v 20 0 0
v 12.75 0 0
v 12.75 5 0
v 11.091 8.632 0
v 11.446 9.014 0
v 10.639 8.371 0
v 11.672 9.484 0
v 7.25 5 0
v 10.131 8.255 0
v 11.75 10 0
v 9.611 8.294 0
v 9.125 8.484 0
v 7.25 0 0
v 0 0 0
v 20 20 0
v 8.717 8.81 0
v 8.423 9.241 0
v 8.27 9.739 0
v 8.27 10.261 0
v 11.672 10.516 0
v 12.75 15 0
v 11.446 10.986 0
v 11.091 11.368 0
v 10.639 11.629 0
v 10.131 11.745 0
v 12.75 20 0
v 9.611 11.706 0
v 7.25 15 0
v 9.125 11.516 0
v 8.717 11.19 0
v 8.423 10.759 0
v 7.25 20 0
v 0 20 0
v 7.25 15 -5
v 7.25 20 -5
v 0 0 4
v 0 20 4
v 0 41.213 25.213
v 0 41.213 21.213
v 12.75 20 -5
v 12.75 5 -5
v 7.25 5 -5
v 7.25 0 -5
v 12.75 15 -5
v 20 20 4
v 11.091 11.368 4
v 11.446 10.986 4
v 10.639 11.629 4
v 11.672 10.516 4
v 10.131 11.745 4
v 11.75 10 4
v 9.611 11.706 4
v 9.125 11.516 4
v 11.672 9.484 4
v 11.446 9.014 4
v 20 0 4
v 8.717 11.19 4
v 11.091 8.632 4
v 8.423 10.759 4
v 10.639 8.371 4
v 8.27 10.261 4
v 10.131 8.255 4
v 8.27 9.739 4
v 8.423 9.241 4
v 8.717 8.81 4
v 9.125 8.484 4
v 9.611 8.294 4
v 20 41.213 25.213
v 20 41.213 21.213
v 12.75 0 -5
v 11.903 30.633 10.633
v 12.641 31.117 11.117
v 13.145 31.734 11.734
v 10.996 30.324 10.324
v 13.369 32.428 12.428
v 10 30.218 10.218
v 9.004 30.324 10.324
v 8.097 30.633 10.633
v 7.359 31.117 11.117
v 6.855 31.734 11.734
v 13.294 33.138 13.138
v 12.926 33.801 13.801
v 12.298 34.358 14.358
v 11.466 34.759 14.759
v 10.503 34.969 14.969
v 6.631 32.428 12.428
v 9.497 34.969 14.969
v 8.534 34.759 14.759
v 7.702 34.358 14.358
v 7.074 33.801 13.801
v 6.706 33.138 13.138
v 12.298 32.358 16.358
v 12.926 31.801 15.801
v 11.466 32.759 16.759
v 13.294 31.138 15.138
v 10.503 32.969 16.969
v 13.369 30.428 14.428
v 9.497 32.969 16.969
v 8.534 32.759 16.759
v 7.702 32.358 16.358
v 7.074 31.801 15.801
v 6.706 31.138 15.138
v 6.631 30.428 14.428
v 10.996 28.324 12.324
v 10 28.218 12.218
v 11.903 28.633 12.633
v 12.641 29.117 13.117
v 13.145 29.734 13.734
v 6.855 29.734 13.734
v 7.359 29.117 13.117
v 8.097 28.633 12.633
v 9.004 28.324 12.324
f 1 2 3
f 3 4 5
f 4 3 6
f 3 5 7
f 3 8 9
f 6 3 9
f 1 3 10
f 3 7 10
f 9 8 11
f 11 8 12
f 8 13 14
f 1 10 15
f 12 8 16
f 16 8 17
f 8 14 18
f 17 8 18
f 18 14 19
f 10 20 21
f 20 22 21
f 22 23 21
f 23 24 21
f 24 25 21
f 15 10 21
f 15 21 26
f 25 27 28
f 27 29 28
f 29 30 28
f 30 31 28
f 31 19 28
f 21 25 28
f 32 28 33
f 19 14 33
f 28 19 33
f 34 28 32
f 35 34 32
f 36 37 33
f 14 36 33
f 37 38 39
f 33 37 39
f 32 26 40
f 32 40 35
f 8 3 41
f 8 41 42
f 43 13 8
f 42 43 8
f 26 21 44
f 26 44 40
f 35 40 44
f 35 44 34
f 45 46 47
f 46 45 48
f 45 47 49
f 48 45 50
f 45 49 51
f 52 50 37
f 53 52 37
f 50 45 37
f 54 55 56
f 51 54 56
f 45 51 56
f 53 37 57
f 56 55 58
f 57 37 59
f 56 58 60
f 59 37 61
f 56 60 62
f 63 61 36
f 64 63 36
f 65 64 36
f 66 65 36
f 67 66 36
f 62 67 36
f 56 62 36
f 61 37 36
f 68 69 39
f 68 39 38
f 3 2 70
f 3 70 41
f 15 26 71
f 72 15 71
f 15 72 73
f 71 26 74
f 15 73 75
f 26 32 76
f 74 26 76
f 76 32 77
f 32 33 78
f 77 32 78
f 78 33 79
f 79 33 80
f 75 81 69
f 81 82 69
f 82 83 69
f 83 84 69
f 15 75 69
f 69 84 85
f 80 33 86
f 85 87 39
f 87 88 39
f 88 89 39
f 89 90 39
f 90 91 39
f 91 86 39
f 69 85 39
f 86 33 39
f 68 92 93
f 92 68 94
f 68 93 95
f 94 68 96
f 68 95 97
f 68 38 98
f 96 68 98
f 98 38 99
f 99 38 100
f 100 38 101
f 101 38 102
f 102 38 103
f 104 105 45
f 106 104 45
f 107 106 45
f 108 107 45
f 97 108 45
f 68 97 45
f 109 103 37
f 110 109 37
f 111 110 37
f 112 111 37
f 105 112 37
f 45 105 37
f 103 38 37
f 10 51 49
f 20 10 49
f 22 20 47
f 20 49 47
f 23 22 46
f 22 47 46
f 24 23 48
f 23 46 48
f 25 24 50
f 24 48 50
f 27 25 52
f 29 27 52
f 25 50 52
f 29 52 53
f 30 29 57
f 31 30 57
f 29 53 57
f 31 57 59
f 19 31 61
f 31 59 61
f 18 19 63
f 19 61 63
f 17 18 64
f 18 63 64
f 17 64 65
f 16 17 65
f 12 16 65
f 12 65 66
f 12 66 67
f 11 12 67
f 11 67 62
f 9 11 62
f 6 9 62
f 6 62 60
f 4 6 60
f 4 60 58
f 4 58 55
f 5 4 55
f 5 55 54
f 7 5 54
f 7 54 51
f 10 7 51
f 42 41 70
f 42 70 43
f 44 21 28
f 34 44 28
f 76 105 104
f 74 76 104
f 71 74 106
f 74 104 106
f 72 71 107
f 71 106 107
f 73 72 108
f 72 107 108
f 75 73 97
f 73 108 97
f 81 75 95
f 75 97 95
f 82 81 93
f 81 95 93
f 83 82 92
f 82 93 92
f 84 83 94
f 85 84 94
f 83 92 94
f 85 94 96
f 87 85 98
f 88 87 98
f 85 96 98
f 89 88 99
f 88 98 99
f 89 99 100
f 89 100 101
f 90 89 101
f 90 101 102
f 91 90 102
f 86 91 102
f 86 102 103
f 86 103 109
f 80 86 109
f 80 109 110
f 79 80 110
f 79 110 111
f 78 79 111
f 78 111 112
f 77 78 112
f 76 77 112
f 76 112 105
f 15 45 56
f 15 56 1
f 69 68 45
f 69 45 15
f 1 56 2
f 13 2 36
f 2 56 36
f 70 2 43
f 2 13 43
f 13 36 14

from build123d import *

# Parameters (mm, degrees)
BOSS_EXTRUDE4_DEPTH = 20
SKETCH6_R           = 1.75
CUT_EXTRUDE3_DEPTH  = 51.482948977
SKETCH7_R           = 3.3782
CUT_EXTRUDE4_DEPTH  = 52.051285634
SKETCH8_W           = 5.5
SKETCH8_H           = 5
BOSS_EXTRUDE5_DEPTH = 5


with BuildPart() as part:
    # Sketch5 → Boss-Extrude4 (new body)
    with BuildSketch(Plane(origin=(0, 0, 0), x_dir=(0, 0, -1), z_dir=(1, 0, 0))):
        Polygon((0, 0), (0, 20), (-21.213203436, 41.213203436), (-25.213203436, 41.213203436), (-4, 20), (-4, 0), align=None)
    extrude(amount=BOSS_EXTRUDE4_DEPTH)

    # Sketch6 → Cut-Extrude3 (cut, through all)
    with BuildSketch(Plane.XY.offset(4)):
        with Locations((10, 10)):
            Circle(SKETCH6_R)
    extrude(amount=-CUT_EXTRUDE3_DEPTH, mode=Mode.SUBTRACT)

    # Sketch7 → Cut-Extrude4 (cut, through all)
    with BuildSketch(Plane(origin=(0, 8, -8), x_dir=(1, 0, 0), z_dir=(0, -0.7071067811865489, 0.7071067811865462))):
        with Locations(Location((10, 31.970562748, 0), (0, 0, 270))):
            Circle(SKETCH7_R)
    extrude(amount=-CUT_EXTRUDE4_DEPTH, mode=Mode.SUBTRACT)

    # Sketch8 → Boss-Extrude5 (add)
    with BuildSketch(Plane(origin=(0, 0, 0), x_dir=(-1, 0, 0), z_dir=(0, 0, -1))):
        with Locations((-10, 17.5)):
            Rectangle(SKETCH8_W, SKETCH8_H)
        with Locations((-10, 2.5)):
            Rectangle(SKETCH8_W, SKETCH8_H)
    extrude(amount=BOSS_EXTRUDE5_DEPTH)


solid = part.part
